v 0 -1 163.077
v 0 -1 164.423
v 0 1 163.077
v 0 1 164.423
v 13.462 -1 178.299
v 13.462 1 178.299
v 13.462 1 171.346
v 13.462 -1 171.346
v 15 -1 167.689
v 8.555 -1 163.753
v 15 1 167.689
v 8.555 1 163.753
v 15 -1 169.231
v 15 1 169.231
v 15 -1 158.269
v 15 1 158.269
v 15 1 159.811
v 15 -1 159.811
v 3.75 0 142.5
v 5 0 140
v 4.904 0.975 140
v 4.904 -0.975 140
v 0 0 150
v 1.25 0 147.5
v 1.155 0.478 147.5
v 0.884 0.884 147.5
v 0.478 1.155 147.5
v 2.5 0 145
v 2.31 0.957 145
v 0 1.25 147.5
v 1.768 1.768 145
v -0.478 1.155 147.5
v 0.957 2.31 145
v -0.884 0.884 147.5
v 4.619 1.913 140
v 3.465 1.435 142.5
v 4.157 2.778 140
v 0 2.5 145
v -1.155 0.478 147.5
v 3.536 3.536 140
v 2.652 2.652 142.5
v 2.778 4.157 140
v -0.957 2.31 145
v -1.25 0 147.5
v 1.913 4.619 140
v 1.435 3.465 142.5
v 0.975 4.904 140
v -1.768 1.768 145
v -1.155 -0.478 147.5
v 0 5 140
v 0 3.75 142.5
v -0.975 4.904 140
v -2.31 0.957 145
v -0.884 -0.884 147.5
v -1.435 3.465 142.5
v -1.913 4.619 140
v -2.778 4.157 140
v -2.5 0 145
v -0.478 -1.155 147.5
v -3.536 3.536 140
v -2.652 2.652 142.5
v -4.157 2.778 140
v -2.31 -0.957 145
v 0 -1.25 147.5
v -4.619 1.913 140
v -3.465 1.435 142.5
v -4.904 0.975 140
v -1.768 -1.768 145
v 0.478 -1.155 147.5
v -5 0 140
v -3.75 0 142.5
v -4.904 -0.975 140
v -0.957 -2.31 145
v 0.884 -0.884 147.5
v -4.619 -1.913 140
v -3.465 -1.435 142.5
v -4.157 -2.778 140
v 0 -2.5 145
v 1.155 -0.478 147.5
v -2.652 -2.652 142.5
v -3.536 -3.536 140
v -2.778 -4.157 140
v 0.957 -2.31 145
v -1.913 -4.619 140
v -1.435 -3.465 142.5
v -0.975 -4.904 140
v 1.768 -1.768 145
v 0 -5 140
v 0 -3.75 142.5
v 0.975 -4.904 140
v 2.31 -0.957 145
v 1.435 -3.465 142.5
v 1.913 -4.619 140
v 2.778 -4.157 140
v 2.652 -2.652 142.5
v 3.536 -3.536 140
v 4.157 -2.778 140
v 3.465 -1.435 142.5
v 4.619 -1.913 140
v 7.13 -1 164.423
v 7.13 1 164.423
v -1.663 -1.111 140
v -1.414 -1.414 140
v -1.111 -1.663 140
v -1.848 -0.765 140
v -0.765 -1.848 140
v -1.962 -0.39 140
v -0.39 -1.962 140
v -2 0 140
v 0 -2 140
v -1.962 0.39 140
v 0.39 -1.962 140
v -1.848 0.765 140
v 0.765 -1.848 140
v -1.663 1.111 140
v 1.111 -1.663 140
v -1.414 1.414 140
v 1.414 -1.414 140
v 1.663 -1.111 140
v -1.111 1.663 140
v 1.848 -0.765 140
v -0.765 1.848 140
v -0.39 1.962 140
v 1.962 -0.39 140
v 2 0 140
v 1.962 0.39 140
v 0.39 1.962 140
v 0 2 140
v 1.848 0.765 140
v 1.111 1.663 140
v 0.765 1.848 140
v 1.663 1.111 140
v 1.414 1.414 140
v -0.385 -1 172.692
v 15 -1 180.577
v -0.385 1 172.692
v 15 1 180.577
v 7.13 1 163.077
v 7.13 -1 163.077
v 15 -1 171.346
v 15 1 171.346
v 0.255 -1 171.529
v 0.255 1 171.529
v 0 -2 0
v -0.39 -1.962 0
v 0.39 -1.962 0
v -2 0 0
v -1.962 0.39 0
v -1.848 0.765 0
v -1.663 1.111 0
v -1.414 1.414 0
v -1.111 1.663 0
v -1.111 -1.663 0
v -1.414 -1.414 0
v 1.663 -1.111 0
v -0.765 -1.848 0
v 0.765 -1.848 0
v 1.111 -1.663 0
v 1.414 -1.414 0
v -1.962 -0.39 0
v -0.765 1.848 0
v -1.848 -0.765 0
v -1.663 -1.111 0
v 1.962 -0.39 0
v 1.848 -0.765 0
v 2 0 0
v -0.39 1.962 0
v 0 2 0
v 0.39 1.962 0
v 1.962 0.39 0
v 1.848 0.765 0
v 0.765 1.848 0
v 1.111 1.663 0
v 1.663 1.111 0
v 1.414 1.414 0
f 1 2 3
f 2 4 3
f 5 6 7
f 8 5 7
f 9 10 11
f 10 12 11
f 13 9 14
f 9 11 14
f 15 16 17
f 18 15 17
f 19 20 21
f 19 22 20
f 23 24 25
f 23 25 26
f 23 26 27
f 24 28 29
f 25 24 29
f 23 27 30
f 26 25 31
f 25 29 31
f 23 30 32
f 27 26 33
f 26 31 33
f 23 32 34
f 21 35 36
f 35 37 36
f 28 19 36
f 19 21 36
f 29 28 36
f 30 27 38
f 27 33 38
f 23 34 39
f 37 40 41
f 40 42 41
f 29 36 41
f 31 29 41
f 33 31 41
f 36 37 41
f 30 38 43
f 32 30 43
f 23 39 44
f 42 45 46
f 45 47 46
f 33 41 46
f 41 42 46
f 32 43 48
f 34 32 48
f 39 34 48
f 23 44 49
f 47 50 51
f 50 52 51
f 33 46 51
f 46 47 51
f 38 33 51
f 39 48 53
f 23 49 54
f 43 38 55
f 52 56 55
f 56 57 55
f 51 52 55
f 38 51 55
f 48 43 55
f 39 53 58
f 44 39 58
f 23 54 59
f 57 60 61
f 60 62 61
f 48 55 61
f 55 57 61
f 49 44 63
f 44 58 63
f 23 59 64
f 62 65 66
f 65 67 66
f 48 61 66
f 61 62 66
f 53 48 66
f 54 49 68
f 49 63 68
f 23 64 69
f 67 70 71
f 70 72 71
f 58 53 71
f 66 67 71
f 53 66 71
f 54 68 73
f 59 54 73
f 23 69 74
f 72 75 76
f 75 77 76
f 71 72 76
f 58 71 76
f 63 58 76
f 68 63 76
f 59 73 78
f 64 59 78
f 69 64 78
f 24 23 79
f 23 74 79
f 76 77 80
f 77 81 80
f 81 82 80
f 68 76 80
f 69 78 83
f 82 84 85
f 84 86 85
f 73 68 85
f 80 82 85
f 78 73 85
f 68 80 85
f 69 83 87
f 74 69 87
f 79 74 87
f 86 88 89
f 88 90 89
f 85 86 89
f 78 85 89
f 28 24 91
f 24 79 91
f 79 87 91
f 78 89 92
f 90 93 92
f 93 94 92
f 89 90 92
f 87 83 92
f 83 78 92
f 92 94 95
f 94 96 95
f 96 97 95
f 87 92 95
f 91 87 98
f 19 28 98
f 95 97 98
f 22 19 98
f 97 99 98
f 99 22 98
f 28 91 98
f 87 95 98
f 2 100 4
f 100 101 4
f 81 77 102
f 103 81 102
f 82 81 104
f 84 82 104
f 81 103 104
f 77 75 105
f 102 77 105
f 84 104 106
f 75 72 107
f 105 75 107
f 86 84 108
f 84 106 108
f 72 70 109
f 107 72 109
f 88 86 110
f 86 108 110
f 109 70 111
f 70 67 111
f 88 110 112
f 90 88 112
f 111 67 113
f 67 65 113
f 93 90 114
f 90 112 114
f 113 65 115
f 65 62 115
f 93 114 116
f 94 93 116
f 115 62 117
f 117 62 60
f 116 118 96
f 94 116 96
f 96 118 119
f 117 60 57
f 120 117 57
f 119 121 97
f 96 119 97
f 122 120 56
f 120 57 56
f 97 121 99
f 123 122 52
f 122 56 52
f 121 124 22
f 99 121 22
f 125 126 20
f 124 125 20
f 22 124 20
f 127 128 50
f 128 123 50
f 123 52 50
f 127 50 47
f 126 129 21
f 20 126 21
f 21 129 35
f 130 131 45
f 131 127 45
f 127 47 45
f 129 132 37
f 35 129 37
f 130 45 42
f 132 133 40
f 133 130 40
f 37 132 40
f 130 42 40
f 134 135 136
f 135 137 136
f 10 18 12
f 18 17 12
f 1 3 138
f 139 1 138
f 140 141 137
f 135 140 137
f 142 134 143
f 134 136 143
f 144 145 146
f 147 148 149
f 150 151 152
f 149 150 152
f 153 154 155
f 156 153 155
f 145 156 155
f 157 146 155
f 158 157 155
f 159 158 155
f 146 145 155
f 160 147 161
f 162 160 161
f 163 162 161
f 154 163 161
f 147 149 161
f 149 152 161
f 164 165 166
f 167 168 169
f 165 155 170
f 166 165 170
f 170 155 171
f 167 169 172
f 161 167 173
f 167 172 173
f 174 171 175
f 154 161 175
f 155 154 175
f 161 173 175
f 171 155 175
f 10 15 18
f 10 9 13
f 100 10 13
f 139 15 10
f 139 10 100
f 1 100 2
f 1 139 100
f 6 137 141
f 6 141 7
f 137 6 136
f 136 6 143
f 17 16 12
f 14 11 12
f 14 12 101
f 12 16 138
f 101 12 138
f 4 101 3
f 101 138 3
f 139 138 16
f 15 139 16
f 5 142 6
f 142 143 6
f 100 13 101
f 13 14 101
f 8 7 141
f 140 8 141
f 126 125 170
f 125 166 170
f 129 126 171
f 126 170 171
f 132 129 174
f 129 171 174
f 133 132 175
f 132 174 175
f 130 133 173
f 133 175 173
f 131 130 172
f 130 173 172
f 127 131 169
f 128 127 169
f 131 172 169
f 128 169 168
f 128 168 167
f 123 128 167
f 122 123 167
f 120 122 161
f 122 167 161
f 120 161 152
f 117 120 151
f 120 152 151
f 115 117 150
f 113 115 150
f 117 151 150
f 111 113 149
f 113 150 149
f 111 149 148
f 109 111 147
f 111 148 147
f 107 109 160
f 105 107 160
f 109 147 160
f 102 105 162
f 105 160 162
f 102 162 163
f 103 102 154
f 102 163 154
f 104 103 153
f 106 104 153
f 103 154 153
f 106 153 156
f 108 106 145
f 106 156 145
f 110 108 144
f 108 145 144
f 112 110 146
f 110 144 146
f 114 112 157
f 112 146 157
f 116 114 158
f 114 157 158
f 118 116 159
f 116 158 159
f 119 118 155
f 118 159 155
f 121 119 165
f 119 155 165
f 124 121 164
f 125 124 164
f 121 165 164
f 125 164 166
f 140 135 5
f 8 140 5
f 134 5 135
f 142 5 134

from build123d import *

# Parameters (mm, degrees)
BOSS_EXTRUDE1_DEPTH        = 1
BOSS_EXTRUDE1_DEPTH_BACK   = 1
BOSS_EXTRUDE1_2_DEPTH      = 1
BOSS_EXTRUDE1_2_DEPTH_BACK = 1


with BuildPart() as part:
    # Sketch2 → Revolve1 (revolve)
    with BuildSketch(Plane(origin=(0, 0, 0), x_dir=(1, 0, 0), z_dir=(0, 1, 0))):
        Polygon((0, -150), (5, -140), (2, -140), (2, 0), (0, 0), align=None)
    revolve(axis=Axis((0, 0, -41.949952025), (0, 0, 1)))


with BuildPart() as body_2:
    # Sketch3 → Boss-Extrude1 (new, two sides: drawn at the far end of the back side and taken through both)
    with BuildSketch(Plane(origin=(0, 0, 0), x_dir=(1, 0, 0), z_dir=(0, 1, 0)).offset(-BOSS_EXTRUDE1_DEPTH_BACK)):
        Polygon((15, -158.269230769), (15, -159.810697115), (8.5546875, -163.753004808), (15, -167.689302885), (15, -169.230769231), (7.130408654, -164.423076923), (0, -164.423076923), (0, -163.076923077), (7.130408654, -163.076923077), align=None)
    extrude(amount=BOSS_EXTRUDE1_DEPTH + BOSS_EXTRUDE1_DEPTH_BACK)


with BuildPart() as body_3:
    # Sketch3 → Boss-Extrude1 2 (new, two sides: drawn at the far end of the back side and taken through both)
    with BuildSketch(Plane(origin=(0, 0, 0), x_dir=(1, 0, 0), z_dir=(0, 1, 0)).offset(-BOSS_EXTRUDE1_2_DEPTH_BACK)):
        Polygon((15, -171.346153846), (15, -180.576923077), (-0.384615385, -172.692307692), (0.255408654, -171.529447115), (13.461538462, -178.299278846), (13.461538462, -171.346153846), align=None)
    extrude(amount=BOSS_EXTRUDE1_2_DEPTH + BOSS_EXTRUDE1_2_DEPTH_BACK)


solid = Compound([part.part, body_2.part, body_3.part])
